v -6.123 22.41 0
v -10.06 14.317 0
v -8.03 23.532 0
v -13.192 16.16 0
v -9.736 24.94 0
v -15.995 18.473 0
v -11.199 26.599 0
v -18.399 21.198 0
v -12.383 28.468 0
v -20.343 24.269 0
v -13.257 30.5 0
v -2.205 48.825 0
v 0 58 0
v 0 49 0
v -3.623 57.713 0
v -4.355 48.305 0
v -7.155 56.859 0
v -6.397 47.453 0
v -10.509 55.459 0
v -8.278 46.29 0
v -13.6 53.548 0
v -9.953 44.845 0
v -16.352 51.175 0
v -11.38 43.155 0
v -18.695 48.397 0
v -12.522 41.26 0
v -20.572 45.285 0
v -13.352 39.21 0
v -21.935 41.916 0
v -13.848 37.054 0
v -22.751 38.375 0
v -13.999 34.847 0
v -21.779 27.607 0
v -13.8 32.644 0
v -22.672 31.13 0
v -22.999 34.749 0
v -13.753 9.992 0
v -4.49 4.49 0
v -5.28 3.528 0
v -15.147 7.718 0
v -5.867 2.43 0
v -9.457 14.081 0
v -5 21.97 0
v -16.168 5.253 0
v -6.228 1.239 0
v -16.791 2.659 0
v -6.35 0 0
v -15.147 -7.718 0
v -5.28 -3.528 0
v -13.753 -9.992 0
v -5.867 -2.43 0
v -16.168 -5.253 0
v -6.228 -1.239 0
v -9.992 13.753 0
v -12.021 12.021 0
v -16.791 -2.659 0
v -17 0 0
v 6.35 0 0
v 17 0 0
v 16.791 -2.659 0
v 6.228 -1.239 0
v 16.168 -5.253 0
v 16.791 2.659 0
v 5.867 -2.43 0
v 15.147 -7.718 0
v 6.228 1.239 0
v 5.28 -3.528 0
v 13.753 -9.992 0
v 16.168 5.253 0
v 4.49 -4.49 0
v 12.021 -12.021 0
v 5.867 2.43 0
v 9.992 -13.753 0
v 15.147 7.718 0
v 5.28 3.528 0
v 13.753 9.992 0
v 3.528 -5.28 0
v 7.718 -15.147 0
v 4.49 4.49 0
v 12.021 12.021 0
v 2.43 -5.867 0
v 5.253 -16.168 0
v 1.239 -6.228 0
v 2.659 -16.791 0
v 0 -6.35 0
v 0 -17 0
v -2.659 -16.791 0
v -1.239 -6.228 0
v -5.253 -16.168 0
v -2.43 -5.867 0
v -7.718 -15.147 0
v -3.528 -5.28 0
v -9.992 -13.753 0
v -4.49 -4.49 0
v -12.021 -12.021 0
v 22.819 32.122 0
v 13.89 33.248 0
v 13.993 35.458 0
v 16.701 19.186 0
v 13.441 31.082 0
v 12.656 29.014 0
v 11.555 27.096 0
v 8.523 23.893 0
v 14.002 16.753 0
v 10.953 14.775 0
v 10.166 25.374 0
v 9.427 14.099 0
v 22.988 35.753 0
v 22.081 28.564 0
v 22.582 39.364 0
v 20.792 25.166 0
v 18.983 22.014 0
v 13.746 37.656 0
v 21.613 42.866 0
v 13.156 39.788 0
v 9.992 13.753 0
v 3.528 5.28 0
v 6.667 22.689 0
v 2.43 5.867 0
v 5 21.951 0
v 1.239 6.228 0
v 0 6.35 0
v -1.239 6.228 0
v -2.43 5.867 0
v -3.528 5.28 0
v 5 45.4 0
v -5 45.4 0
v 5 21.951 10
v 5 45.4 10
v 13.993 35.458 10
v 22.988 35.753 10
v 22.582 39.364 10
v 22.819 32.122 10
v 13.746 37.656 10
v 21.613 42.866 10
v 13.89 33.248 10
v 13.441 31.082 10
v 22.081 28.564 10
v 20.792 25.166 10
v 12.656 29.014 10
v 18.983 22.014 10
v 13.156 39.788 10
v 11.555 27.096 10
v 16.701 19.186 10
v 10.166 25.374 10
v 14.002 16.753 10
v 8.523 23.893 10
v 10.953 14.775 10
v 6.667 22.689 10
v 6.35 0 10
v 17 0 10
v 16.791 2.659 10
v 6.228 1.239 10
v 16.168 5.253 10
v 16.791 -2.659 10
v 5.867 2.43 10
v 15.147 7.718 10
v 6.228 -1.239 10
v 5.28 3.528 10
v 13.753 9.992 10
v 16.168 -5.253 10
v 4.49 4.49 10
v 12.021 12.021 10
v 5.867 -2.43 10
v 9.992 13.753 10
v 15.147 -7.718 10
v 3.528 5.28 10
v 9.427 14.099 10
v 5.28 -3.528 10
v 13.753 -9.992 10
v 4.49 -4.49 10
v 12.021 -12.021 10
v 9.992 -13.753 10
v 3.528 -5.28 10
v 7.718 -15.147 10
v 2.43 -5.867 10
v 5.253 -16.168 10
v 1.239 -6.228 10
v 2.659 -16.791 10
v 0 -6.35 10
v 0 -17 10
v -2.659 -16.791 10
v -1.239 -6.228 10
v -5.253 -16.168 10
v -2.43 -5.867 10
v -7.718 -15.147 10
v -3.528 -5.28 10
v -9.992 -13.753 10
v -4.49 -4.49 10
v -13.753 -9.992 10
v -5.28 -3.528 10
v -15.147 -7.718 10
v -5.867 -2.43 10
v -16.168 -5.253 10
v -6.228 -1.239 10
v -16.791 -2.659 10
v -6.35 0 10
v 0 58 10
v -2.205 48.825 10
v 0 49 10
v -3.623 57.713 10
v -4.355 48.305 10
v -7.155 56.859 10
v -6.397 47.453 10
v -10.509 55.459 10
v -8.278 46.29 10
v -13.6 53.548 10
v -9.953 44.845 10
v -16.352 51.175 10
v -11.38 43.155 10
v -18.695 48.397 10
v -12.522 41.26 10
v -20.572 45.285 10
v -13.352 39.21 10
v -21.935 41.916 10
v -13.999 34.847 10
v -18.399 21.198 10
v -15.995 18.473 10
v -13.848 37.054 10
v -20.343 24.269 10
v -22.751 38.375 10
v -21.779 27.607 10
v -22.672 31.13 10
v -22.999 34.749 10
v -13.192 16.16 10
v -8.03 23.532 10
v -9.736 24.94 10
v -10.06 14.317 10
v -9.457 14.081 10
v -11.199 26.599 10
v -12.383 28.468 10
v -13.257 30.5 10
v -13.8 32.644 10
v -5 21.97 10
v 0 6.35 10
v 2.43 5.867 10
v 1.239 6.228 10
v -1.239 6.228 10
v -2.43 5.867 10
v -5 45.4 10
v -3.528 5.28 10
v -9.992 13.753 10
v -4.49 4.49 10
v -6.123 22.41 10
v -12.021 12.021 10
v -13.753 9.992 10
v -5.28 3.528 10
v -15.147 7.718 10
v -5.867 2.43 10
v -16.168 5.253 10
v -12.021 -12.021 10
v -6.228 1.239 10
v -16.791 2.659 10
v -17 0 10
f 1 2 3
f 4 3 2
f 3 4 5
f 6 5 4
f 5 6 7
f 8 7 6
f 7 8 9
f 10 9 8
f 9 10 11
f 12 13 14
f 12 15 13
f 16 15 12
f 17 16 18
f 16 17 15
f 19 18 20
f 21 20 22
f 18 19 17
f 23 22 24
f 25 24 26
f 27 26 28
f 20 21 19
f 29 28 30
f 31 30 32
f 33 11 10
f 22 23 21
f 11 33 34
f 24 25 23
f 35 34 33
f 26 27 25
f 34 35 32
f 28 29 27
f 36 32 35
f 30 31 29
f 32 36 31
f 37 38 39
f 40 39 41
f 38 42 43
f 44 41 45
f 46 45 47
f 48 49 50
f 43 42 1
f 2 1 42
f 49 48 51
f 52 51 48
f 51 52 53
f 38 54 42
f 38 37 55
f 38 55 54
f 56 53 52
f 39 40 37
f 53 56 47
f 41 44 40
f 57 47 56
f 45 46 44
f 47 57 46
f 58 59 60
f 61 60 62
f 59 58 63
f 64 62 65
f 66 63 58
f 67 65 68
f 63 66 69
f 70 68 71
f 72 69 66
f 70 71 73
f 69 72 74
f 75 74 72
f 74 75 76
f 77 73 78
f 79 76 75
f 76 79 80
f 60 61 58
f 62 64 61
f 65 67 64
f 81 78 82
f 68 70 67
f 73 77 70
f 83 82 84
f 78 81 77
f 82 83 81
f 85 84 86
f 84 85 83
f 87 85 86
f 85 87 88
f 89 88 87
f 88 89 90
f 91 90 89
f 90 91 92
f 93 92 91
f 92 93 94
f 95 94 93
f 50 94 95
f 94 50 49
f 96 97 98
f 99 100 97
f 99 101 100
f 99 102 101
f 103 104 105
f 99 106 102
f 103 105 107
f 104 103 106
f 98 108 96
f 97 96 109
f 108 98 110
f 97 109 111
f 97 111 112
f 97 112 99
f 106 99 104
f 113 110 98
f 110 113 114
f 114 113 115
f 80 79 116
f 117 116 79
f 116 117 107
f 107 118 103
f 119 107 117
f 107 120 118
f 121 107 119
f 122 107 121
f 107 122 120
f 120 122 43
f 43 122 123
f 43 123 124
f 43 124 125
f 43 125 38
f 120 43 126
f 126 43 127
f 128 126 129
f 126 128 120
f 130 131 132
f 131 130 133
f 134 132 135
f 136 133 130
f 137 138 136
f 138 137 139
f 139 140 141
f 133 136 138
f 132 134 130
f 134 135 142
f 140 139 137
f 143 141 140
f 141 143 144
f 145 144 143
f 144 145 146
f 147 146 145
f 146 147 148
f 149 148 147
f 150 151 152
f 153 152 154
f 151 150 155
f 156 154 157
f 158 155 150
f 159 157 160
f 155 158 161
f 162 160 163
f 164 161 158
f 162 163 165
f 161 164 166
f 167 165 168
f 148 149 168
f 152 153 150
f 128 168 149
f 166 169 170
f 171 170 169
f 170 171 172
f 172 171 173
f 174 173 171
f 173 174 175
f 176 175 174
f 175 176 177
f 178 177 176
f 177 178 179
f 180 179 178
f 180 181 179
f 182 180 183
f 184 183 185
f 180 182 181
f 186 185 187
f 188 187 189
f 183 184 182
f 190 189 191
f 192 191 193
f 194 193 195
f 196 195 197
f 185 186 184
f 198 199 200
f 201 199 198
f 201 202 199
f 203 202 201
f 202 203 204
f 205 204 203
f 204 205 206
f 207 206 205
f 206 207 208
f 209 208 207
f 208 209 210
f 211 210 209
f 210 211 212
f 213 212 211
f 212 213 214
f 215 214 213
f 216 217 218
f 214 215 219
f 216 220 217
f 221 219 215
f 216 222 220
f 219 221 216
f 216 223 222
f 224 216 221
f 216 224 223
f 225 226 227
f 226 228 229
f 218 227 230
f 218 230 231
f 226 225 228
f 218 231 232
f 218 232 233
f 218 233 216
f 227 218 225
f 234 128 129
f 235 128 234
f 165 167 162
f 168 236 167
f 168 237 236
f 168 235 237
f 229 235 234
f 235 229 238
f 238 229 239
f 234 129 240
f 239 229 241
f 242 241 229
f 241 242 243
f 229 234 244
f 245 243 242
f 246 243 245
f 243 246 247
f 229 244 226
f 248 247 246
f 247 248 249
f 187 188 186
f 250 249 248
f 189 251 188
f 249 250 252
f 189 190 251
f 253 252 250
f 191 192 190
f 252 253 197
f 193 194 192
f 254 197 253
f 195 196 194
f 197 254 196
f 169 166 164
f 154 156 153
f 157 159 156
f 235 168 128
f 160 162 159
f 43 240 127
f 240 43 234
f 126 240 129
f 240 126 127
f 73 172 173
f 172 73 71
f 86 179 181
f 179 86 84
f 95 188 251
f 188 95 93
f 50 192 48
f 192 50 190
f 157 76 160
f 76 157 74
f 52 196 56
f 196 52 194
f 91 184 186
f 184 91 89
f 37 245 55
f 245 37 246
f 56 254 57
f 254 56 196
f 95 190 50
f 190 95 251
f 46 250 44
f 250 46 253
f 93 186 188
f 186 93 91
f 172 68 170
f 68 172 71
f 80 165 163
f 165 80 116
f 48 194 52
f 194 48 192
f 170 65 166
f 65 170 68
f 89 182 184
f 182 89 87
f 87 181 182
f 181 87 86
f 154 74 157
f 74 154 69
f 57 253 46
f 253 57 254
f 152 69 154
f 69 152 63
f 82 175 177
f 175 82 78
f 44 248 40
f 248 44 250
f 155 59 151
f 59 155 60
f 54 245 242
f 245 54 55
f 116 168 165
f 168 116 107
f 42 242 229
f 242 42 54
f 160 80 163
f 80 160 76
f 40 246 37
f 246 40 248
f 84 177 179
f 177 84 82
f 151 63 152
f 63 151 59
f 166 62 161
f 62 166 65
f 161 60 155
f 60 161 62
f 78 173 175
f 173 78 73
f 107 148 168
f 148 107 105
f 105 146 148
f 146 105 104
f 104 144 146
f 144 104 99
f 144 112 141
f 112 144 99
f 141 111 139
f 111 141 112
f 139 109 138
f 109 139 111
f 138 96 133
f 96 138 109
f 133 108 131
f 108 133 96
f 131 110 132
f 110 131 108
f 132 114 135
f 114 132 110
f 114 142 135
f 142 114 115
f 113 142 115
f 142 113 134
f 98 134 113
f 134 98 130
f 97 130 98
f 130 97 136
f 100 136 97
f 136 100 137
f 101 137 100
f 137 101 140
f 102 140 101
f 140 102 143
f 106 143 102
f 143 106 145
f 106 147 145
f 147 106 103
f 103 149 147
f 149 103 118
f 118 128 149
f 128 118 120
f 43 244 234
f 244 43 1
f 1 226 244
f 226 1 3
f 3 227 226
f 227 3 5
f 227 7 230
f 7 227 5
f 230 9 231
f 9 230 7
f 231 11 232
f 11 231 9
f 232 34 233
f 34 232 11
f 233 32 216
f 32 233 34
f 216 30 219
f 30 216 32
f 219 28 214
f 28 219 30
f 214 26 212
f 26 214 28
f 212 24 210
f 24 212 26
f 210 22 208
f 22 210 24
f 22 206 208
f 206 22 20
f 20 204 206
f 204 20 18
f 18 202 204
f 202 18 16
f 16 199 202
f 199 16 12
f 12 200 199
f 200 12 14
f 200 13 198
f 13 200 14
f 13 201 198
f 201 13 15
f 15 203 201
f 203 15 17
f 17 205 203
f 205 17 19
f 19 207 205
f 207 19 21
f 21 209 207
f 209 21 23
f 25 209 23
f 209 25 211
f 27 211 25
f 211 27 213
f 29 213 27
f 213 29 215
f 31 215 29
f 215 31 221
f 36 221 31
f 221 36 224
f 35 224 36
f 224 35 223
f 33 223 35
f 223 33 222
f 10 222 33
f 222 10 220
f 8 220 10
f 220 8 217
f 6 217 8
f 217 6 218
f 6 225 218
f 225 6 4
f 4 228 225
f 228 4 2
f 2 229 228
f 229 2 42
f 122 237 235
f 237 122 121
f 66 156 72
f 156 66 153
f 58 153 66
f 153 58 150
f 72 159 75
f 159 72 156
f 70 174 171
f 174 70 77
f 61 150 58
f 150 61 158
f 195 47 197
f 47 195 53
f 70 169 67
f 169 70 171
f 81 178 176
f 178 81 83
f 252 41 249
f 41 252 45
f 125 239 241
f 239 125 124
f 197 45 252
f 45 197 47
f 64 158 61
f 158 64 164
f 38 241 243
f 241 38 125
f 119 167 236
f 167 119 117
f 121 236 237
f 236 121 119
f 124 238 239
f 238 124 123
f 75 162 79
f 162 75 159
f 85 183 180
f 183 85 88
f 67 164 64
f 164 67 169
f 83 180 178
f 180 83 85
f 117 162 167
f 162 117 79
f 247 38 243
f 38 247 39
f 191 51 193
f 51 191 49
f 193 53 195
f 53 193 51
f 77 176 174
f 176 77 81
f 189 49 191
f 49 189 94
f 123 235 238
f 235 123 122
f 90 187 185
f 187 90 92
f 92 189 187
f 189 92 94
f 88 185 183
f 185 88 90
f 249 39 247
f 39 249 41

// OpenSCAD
$fn = 32;

// ----------------------------------------------------------------------
// Hook: 70 mm shank into a 14 mm curl, 10 mm thick
// ----------------------------------------------------------------------

// --- parameters (mm) ---
shank_len = 70;           // shank length from the boss centre
shank_w = 10;             // shank width
boss_d = 34;              // boss diameter
bore_d = 12.7;            // boss bore
curl_in = 14;             // curl inner radius
curl_out = 23;            // curl outer radius
curl_sweep = 290;         // curl sweep angle
hook_t = 10;              // hook thickness

shank_profile = [[-5, 45.4], [5, 45.4], [5, 15], [-5, 15]];
boss_profile = [[17, 0], [16.791, 2.659], [16.168, 5.253], [15.147, 7.718], [13.753, 9.992], [12.021, 12.021], [9.992, 13.753], [7.718, 15.147], [5.253, 16.168], [2.659, 16.791], [0, 17], [-2.659, 16.791], [-5.253, 16.168], [-7.718, 15.147], [-9.992, 13.753], [-12.021, 12.021], [-13.753, 9.992], [-15.147, 7.718], [-16.168, 5.253], [-16.791, 2.659], [-17, 0], [-16.791, -2.659], [-16.168, -5.253], [-15.147, -7.718], [-13.753, -9.992], [-12.021, -12.021], [-9.992, -13.753], [-7.718, -15.147], [-5.253, -16.168], [-2.659, -16.791], [0, -17], [2.659, -16.791], [5.253, -16.168], [7.718, -15.147], [9.992, -13.753], [12.021, -12.021], [13.753, -9.992], [15.147, -7.718], [16.168, -5.253], [16.791, -2.659]];
curl_profile = [[0, 58], [-3.623, 57.713], [-7.155, 56.859], [-10.509, 55.459], [-13.6, 53.548], [-16.352, 51.175], [-18.695, 48.397], [-20.572, 45.285], [-21.935, 41.916], [-22.751, 38.375], [-22.999, 34.749], [-22.672, 31.13], [-21.779, 27.607], [-20.343, 24.269], [-18.399, 21.198], [-15.995, 18.473], [-13.192, 16.16], [-10.06, 14.317], [-6.677, 12.99], [-3.126, 12.213], [0.502, 12.005], [4.117, 12.372], [7.63, 13.303], [10.953, 14.775], [14.002, 16.753], [16.701, 19.186], [18.983, 22.014], [20.792, 25.166], [22.081, 28.564], [22.819, 32.122], [22.988, 35.753], [22.582, 39.364], [21.613, 42.866], [13.156, 39.788], [13.746, 37.656], [13.993, 35.458], [13.89, 33.248], [13.441, 31.082], [12.656, 29.014], [11.555, 27.096], [10.166, 25.374], [8.523, 23.893], [6.667, 22.689], [4.644, 21.793], [2.506, 21.226], [0.305, 21.003], [-1.903, 21.13], [-4.064, 21.603], [-6.123, 22.41], [-8.03, 23.532], [-9.736, 24.94], [-11.199, 26.599], [-12.383, 28.468], [-13.257, 30.5], [-13.8, 32.644], [-13.999, 34.847], [-13.848, 37.054], [-13.352, 39.21], [-12.522, 41.26], [-11.38, 43.155], [-9.953, 44.845], [-8.278, 46.29], [-6.397, 47.453], [-4.355, 48.305], [-2.205, 48.825], [0, 49]];

difference() {
  union() {
    /* three overlapping outlines: shank, boss and the smooth curl */
    linear_extrude(height = hook_t) polygon(shank_profile);
    linear_extrude(height = hook_t) polygon(boss_profile);
    linear_extrude(height = hook_t) polygon(curl_profile);
  }
  translate([0, 0, -2.5]) cylinder(h = hook_t + 5, d = bore_d);
}
